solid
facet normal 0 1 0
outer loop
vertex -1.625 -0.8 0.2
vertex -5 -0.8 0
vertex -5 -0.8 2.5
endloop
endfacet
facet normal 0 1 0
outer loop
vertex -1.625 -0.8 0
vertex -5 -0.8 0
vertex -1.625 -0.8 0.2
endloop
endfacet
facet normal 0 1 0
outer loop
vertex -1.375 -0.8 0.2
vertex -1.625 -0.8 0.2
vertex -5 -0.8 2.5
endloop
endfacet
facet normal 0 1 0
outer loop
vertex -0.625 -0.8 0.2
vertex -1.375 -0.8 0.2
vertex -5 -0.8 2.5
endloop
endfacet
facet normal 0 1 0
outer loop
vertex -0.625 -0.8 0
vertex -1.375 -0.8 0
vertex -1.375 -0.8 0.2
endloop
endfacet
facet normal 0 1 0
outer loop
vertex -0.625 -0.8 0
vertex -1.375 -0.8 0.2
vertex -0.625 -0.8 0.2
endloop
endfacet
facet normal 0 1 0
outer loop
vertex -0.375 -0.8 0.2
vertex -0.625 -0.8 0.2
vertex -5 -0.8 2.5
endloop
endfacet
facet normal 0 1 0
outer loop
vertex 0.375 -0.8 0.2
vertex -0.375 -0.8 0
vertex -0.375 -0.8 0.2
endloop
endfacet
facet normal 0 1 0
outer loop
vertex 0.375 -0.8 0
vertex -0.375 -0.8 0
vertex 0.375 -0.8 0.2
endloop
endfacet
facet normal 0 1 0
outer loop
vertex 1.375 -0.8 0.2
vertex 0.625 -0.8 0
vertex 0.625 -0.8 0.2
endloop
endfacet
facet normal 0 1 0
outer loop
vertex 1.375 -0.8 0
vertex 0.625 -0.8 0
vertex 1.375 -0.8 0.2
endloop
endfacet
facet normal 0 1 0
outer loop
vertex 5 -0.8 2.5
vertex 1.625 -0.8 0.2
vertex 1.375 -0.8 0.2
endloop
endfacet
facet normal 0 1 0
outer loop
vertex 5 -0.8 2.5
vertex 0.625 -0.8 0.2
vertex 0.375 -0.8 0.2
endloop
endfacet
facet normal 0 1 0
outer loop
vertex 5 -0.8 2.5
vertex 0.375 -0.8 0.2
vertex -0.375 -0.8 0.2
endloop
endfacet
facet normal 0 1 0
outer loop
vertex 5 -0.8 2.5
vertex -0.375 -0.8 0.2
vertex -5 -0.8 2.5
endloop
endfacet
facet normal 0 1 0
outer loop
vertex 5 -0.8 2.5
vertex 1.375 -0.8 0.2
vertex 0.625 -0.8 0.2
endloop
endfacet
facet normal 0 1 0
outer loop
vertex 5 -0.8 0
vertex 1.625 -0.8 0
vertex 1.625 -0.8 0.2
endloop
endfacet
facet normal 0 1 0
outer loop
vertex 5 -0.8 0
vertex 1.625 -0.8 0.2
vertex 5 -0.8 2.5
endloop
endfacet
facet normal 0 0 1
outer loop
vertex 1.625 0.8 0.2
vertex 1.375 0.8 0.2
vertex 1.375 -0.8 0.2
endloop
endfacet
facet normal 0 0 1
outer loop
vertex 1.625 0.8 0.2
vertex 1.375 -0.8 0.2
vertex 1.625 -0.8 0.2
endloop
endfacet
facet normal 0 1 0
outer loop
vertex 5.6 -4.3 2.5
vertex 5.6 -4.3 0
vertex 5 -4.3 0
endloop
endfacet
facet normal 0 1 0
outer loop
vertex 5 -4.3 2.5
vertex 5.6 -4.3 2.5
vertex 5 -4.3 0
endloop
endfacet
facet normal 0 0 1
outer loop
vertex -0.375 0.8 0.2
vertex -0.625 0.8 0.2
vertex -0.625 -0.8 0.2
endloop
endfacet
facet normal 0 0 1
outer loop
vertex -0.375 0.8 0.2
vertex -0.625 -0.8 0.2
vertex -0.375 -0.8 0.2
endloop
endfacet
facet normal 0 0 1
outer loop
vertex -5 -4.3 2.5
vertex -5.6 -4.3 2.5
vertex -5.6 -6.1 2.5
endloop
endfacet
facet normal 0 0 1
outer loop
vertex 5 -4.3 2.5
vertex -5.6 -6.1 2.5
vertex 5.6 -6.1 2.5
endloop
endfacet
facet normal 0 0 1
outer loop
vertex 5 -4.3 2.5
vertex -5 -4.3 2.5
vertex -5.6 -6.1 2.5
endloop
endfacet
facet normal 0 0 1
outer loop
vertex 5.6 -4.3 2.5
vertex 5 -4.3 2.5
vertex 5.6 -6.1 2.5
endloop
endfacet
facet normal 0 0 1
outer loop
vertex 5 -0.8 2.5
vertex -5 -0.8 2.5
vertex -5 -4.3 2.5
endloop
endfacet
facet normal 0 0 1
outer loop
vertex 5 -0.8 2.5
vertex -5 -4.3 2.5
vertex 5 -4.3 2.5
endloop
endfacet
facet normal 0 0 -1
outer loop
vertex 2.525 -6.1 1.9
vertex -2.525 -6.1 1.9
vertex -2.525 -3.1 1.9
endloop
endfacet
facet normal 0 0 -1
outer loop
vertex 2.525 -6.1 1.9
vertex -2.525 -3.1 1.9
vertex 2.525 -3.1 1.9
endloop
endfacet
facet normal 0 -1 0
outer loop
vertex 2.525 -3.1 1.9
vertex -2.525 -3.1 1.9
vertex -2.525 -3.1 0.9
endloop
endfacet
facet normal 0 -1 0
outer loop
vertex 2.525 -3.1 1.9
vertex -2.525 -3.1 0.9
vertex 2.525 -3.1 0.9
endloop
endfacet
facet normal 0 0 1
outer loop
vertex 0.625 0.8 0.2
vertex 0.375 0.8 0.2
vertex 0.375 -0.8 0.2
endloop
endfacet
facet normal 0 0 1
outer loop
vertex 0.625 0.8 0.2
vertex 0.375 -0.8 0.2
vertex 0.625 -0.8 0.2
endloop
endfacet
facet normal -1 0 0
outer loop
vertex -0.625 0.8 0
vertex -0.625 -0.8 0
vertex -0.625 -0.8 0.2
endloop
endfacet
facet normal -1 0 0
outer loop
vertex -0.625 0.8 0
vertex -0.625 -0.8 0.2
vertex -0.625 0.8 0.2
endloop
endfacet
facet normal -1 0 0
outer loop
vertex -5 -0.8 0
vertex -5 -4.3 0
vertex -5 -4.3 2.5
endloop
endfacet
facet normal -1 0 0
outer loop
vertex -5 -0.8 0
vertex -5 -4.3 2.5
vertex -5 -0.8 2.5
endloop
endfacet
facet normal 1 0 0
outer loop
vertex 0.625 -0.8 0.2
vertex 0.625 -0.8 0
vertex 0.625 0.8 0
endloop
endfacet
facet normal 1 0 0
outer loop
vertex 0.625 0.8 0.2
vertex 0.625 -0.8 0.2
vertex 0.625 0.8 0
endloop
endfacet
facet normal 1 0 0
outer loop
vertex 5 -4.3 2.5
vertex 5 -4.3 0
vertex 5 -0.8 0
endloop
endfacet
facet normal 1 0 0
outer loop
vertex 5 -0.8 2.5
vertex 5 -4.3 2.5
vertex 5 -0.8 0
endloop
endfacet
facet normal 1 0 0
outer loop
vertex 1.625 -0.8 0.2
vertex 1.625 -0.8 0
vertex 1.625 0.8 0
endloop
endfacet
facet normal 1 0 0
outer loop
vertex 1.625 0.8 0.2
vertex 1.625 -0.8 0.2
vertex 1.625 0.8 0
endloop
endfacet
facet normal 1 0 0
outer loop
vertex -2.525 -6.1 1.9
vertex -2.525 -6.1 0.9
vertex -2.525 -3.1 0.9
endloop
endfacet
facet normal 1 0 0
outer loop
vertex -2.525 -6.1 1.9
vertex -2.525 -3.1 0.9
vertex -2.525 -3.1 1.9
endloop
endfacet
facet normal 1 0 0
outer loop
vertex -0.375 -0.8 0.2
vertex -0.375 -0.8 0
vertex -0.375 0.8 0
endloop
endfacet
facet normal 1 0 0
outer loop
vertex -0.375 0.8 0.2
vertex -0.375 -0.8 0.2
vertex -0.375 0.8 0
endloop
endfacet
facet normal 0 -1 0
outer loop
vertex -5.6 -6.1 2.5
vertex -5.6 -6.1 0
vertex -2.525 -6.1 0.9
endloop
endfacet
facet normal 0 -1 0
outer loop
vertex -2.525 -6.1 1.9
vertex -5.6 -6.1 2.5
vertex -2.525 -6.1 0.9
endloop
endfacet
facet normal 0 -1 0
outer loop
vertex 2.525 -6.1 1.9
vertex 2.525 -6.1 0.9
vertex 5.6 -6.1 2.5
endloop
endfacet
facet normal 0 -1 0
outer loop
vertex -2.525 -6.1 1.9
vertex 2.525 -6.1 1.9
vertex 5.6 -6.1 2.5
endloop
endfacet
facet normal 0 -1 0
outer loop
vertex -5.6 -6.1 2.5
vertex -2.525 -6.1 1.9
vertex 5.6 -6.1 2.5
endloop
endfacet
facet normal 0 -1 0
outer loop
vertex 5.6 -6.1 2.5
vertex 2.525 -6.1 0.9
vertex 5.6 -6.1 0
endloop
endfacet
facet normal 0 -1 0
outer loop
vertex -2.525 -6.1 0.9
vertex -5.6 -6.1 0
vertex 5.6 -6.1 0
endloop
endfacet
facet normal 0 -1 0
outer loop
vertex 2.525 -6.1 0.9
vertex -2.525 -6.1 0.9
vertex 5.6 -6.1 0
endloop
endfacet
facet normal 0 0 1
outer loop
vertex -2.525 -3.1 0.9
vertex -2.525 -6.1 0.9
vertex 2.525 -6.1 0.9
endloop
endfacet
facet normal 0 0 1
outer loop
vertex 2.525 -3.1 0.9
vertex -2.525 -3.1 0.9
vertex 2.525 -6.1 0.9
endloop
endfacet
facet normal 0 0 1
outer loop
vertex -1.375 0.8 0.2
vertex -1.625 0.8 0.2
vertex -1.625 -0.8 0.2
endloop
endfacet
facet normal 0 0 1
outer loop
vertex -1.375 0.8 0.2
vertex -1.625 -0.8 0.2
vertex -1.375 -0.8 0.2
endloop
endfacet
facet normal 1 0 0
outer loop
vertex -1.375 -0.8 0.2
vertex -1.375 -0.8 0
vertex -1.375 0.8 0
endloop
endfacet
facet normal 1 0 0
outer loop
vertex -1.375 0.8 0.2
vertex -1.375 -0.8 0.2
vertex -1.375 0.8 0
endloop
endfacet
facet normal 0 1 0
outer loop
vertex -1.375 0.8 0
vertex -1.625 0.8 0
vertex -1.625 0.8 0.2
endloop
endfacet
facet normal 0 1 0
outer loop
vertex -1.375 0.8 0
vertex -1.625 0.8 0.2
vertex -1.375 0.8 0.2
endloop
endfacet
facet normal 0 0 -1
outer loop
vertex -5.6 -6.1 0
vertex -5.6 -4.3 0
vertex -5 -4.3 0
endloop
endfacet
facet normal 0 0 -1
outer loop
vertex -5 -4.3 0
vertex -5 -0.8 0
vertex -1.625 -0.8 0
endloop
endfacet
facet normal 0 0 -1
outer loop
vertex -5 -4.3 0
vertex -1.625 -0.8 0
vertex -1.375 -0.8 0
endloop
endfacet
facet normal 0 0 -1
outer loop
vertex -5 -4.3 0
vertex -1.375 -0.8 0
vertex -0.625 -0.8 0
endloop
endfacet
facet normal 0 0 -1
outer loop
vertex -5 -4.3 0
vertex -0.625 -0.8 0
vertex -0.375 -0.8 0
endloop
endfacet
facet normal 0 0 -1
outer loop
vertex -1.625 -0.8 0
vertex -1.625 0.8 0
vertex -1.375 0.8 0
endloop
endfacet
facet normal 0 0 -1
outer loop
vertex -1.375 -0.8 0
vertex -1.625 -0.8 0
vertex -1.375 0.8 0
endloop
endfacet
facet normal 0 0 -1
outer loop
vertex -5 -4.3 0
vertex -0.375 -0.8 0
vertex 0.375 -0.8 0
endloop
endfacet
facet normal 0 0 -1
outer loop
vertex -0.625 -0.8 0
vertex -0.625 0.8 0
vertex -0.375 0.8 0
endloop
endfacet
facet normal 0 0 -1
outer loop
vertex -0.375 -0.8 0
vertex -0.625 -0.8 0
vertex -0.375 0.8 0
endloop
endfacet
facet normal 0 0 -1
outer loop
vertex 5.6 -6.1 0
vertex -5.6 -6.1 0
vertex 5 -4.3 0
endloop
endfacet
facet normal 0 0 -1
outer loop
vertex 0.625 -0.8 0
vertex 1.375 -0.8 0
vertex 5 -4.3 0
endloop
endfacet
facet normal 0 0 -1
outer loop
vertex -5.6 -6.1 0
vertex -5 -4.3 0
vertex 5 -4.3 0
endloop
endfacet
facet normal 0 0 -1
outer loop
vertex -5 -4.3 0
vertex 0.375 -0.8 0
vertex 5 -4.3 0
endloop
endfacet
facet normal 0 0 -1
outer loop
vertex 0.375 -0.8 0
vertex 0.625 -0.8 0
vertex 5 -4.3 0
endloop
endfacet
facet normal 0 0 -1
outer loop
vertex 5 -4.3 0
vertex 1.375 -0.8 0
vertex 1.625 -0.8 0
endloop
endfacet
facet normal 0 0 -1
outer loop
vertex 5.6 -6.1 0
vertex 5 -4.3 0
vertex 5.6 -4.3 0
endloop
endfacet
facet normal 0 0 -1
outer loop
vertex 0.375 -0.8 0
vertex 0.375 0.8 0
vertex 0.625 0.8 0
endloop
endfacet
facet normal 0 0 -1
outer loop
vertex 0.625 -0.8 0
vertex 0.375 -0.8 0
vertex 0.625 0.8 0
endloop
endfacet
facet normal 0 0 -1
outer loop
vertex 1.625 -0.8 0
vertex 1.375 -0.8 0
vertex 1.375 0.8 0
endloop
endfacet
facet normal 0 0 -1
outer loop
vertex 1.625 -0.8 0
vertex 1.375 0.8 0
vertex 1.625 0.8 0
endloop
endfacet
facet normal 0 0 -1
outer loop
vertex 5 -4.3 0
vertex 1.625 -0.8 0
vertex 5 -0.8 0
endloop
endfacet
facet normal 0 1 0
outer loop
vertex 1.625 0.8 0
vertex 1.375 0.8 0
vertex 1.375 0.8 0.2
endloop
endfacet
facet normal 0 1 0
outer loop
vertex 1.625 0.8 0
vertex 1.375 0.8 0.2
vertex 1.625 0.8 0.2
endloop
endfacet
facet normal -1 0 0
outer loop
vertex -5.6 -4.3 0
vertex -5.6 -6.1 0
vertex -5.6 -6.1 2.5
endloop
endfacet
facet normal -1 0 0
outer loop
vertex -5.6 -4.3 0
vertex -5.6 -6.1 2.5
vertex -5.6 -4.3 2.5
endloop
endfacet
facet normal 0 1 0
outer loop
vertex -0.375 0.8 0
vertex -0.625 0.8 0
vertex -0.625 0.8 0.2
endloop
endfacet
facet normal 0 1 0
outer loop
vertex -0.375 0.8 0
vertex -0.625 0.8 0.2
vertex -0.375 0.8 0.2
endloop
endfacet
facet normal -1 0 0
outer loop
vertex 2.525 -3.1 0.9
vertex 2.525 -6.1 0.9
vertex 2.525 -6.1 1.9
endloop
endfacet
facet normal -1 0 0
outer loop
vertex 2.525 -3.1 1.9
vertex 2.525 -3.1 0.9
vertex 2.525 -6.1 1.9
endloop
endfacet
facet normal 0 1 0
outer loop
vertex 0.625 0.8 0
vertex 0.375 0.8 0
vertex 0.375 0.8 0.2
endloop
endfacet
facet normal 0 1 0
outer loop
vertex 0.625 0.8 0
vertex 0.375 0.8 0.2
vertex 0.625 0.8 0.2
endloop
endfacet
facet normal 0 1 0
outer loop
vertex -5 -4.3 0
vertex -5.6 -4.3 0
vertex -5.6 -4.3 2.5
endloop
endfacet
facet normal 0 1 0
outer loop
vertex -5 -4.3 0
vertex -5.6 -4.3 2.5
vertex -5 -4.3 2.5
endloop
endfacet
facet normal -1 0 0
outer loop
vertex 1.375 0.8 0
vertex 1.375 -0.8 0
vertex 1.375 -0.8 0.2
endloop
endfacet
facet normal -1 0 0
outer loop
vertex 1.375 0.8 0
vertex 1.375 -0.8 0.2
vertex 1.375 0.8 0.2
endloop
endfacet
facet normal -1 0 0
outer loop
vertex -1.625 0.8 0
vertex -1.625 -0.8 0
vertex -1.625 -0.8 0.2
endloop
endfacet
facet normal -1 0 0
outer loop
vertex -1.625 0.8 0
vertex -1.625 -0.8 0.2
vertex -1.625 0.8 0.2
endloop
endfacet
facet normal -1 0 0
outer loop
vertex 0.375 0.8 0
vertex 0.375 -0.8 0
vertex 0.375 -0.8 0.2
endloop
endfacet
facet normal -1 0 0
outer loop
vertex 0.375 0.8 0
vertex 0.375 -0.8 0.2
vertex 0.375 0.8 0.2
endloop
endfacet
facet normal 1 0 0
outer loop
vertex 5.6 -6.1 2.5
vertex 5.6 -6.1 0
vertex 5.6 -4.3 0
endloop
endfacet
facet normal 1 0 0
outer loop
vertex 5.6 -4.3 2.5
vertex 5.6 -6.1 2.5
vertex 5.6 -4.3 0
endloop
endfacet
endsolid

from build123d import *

# Parameters (mm, degrees)
SKETCH_W            = 11.2
SKETCH_H            = 5.3
PAD_DEPTH           = 2.5
SKETCH001_W         = 0.25
SKETCH001_H         = 1.6
PAD001_DEPTH        = 0.2
LINEARPATTERN_COUNT = 4
LINEARPATTERN_PITCH = 1
SKETCH002_W         = 0.6
SKETCH002_H         = 3.5
POCKET_DEPTH        = 29.28159
SKETCH003_W         = 5.05
SKETCH003_H         = 1
POCKET001_DEPTH     = 3


with BuildPart() as part:
    # Sketch → Pad (new body)
    with BuildSketch(Plane.XY):
        with Locations((0, -3.45)):
            Rectangle(SKETCH_W, SKETCH_H)
    extrude(amount=PAD_DEPTH)

    # Sketch001 → Pad001 (join)
    with BuildSketch(Plane.XY):
        with Locations((-1.5, 0)):
            Rectangle(SKETCH001_W, SKETCH001_H)
    pad001 = extrude(amount=PAD001_DEPTH)

    # LinearPattern: Pad001 ×4
    with Locations(*[(i * LINEARPATTERN_PITCH, 0, 0) for i in range(1, LINEARPATTERN_COUNT)]):
        add(pad001)

    # Sketch002 → Pocket (cut, through all)
    with BuildSketch(Plane.XY):
        with Locations((-5.3, -2.55)):
            Rectangle(SKETCH002_W, SKETCH002_H)
    pocket = extrude(amount=POCKET_DEPTH, mode=Mode.SUBTRACT)

    # Mirrored: Pocket across YZ
    add(pocket.mirror(Plane.YZ), mode=Mode.SUBTRACT)

    # Sketch003 (on Face3 of Mirrored) → Pocket001 (cut)
    with BuildSketch(Plane.XZ.offset(6.1)):
        with Locations((0, 1.4)):
            Rectangle(SKETCH003_W, SKETCH003_H)
    extrude(amount=-POCKET001_DEPTH, mode=Mode.SUBTRACT)


solid = part.part
